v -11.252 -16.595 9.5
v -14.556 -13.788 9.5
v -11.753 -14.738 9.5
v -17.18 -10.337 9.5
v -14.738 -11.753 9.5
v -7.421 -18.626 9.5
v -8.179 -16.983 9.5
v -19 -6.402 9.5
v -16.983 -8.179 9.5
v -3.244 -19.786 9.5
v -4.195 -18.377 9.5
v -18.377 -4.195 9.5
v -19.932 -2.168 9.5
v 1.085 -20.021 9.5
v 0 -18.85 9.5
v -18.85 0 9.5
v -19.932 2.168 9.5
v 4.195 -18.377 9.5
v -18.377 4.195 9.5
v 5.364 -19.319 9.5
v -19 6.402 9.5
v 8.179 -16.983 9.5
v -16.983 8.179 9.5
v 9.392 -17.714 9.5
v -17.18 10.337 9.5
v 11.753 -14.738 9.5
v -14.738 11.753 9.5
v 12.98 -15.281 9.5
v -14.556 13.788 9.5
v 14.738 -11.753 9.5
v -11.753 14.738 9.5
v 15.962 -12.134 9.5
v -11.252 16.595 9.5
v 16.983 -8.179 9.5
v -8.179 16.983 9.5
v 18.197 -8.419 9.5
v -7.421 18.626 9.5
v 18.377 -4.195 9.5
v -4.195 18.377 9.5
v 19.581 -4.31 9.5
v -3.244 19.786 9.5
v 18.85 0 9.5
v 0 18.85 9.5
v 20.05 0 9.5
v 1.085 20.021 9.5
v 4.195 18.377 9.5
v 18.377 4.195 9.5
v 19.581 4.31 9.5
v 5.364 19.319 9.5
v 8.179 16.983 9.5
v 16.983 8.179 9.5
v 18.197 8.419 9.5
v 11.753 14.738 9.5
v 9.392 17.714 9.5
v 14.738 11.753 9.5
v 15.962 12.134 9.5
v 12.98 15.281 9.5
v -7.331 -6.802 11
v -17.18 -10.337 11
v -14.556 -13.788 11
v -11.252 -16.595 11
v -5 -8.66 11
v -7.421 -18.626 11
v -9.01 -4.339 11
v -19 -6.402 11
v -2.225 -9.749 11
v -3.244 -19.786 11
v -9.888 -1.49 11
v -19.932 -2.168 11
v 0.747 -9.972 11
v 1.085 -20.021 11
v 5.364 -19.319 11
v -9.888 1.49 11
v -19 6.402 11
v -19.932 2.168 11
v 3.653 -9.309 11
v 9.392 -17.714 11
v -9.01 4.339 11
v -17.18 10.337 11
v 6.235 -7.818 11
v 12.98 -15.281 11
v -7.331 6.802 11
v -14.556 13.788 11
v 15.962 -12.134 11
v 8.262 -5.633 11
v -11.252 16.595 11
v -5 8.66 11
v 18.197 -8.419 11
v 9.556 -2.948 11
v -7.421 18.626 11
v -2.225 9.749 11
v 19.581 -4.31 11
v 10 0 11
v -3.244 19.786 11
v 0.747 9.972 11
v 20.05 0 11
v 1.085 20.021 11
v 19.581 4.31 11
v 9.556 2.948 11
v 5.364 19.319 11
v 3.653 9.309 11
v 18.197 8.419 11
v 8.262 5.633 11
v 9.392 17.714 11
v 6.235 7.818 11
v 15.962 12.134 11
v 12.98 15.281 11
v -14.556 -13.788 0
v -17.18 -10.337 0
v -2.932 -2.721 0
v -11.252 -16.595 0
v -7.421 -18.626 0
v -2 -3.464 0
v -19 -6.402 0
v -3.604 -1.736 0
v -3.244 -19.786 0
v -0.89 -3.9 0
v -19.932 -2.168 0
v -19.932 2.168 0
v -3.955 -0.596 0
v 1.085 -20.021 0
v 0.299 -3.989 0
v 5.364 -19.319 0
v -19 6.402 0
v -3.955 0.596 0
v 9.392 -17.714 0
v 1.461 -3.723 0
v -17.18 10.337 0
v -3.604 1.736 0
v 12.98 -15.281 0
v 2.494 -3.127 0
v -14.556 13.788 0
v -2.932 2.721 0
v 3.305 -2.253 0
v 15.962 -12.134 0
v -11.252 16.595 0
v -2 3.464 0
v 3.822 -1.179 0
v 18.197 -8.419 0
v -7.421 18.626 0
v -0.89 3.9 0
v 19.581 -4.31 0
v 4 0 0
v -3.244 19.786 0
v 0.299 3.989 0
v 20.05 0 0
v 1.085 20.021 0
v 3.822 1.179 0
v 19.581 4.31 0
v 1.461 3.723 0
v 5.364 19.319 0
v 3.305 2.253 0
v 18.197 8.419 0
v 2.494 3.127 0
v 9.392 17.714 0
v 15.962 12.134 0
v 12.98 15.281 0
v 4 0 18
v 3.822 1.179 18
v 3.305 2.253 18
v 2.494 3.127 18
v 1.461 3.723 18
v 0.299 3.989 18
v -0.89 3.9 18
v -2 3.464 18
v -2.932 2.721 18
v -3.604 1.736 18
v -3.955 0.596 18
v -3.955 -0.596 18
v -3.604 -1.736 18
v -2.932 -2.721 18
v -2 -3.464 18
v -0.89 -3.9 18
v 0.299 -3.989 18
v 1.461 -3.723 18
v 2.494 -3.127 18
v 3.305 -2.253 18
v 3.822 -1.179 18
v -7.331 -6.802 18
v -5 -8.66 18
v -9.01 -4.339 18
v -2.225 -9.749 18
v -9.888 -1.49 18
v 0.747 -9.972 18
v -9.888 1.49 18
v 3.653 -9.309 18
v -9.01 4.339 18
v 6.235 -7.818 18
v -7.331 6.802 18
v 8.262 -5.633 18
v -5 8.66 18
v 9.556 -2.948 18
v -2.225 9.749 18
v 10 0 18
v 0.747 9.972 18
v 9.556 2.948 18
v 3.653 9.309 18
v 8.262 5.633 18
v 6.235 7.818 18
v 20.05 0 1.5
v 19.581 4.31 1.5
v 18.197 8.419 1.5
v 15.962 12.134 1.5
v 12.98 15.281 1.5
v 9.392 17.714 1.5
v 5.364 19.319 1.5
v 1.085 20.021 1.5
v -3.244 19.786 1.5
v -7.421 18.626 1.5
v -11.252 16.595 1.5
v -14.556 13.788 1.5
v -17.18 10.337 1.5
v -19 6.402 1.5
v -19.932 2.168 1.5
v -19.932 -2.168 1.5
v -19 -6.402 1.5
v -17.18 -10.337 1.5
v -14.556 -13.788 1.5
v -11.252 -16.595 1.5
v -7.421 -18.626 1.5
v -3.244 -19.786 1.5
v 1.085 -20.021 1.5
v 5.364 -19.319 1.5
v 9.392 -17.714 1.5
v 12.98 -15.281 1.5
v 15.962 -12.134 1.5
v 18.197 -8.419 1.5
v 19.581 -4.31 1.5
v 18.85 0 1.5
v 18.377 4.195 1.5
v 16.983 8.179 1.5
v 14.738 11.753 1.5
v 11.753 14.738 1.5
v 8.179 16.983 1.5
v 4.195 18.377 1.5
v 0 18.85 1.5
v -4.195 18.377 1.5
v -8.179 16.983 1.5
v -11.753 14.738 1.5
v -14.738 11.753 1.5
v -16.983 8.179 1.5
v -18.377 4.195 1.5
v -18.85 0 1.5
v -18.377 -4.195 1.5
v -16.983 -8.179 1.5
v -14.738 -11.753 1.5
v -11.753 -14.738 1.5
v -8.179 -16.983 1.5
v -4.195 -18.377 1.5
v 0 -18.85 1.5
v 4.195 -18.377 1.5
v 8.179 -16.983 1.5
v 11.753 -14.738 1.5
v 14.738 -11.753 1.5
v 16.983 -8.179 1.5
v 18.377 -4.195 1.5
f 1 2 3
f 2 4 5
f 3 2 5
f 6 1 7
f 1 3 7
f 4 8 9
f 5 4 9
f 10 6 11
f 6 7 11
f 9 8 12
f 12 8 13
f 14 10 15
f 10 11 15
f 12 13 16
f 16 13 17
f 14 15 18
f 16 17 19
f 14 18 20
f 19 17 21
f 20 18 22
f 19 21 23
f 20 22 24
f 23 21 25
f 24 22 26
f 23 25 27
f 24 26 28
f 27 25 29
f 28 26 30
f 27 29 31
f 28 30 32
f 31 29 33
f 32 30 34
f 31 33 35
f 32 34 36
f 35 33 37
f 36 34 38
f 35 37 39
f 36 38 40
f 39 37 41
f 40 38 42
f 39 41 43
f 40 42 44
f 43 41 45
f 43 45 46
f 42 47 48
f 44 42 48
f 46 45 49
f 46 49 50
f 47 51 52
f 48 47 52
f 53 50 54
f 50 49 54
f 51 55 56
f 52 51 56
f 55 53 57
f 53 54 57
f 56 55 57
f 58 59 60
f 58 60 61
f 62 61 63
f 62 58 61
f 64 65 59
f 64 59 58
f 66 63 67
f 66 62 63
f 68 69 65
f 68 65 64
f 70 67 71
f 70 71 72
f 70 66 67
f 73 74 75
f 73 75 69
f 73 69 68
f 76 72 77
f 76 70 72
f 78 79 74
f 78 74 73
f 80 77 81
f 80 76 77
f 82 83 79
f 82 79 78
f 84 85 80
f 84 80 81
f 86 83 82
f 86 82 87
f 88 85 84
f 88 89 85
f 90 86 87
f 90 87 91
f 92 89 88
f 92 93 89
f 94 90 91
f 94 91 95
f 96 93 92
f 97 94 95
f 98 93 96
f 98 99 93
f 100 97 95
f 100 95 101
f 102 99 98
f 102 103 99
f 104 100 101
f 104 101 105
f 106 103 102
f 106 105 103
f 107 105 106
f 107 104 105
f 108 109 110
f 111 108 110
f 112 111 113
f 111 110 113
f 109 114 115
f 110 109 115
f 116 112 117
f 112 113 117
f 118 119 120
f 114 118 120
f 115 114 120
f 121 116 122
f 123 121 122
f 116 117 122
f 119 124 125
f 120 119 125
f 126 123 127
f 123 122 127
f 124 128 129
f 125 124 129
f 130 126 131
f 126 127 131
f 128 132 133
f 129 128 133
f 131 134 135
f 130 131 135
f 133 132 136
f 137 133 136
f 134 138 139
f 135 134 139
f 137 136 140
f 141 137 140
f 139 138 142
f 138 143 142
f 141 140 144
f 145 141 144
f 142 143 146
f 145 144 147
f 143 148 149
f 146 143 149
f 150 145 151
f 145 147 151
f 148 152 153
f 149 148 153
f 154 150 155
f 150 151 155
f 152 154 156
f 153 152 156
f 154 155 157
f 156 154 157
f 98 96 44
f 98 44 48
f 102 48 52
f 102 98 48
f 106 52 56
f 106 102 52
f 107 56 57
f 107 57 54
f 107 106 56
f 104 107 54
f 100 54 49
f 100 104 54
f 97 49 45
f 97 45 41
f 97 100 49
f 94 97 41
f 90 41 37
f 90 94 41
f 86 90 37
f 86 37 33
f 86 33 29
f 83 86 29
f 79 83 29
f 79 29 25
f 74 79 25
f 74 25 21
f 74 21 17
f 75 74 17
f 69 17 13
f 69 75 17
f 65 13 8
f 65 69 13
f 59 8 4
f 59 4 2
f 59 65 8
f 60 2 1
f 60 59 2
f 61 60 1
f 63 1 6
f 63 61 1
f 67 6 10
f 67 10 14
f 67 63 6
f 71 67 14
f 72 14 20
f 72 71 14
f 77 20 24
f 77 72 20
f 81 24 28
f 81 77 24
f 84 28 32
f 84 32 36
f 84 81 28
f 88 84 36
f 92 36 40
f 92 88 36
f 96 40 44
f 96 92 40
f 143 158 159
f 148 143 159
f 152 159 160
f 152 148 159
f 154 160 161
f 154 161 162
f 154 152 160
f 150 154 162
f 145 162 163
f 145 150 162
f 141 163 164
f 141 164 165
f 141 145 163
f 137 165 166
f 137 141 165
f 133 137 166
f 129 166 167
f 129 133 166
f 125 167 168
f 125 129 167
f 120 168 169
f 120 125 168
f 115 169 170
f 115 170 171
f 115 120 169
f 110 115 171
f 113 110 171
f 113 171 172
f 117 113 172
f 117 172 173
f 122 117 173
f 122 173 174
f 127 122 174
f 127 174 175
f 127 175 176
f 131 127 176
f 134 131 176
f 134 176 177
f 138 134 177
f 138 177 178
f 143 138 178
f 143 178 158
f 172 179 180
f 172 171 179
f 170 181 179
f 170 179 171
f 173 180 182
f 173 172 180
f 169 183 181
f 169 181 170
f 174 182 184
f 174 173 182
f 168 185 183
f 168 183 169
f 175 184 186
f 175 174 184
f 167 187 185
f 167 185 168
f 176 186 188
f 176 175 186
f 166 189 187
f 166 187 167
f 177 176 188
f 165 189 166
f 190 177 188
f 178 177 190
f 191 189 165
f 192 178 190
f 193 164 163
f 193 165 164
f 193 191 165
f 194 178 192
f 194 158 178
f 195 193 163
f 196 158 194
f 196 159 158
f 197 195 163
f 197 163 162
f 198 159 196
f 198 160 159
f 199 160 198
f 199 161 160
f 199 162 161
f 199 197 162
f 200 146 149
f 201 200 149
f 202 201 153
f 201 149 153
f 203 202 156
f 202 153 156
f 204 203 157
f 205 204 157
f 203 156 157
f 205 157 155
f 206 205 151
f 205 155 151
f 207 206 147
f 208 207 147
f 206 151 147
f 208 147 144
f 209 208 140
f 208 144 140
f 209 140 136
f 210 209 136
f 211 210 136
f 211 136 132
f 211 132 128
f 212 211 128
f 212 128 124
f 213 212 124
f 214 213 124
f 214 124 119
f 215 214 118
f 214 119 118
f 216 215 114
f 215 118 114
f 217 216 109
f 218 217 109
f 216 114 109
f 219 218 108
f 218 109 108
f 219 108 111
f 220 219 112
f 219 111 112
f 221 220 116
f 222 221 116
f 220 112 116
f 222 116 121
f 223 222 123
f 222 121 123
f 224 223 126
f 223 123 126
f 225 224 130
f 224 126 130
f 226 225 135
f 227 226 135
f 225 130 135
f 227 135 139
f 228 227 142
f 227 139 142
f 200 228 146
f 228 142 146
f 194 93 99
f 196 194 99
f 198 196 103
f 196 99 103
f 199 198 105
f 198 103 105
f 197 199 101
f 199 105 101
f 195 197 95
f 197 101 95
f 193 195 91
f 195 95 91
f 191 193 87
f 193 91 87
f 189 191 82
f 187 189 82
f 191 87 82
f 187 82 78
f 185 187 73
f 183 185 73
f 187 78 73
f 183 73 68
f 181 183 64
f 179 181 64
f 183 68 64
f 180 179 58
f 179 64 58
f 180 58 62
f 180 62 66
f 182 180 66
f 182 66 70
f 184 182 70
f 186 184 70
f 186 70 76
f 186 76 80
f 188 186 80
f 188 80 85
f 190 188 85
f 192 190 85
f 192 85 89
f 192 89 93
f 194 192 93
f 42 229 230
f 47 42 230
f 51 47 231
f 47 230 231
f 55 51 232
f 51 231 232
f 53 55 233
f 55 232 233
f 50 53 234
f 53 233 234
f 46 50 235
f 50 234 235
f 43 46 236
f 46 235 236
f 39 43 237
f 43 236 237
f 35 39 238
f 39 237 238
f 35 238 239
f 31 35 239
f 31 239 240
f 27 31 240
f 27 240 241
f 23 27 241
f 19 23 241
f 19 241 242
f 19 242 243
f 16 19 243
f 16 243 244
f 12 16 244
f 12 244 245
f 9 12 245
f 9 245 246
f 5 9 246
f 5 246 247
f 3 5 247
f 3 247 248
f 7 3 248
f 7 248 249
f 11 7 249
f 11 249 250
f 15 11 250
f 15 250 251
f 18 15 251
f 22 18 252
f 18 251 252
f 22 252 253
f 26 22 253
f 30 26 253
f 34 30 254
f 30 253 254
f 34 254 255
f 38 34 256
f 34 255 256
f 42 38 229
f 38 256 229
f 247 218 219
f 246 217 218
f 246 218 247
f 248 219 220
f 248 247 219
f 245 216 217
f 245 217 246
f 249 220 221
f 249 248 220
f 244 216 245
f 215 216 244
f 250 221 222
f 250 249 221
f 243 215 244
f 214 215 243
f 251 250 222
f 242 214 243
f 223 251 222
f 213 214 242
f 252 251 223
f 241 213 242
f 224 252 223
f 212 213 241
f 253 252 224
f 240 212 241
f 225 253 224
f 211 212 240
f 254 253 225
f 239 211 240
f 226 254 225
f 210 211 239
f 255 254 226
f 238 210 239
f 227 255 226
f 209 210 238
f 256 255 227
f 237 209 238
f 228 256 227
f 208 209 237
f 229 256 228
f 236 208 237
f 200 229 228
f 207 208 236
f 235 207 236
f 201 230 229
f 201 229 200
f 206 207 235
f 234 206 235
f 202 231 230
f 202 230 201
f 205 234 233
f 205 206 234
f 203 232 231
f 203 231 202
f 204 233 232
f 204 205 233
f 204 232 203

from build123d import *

# Parameters (mm, degrees)
SKETCH1_R           = 18.85
SKETCH1_R_2         = 4
BOSS_EXTRUDE1_DEPTH = 11
SKETCH1_3_R         = 20.05
SKETCH1_3_R_2       = 18.85
BOSS_EXTRUDE2_DEPTH = 1.5
BOSS_EXTRUDE3_START = 9.5
SKETCH1_4_R         = 20.05
SKETCH1_4_R_2       = 18.85
BOSS_EXTRUDE3_DEPTH = 1.5
SKETCH1_5_R         = 10
SKETCH1_5_R_2       = 4
BOSS_EXTRUDE4_DEPTH = 18


with BuildPart() as part:
    # Sketch1 → Boss-Extrude1 (new body)
    with BuildSketch(Plane.XY):
        Circle(SKETCH1_R)
        Circle(SKETCH1_R_2, mode=Mode.SUBTRACT)
    extrude(amount=BOSS_EXTRUDE1_DEPTH)

    # Sketch1<3> → Boss-Extrude2 (add)
    with BuildSketch(Plane.XY):
        Circle(SKETCH1_3_R)
        Circle(SKETCH1_3_R_2, mode=Mode.SUBTRACT)
    extrude(amount=BOSS_EXTRUDE2_DEPTH)

    # Sketch1<4> → Boss-Extrude3 (add)
    with BuildSketch(Plane.XY.offset(BOSS_EXTRUDE3_START)):
        Circle(SKETCH1_4_R)
        Circle(SKETCH1_4_R_2, mode=Mode.SUBTRACT)
    extrude(amount=BOSS_EXTRUDE3_DEPTH)

    # Sketch1<5> → Boss-Extrude4 (add)
    with BuildSketch(Plane.XY):
        Circle(SKETCH1_5_R)
        Circle(SKETCH1_5_R_2, mode=Mode.SUBTRACT)
    extrude(amount=BOSS_EXTRUDE4_DEPTH)


solid = part.part
